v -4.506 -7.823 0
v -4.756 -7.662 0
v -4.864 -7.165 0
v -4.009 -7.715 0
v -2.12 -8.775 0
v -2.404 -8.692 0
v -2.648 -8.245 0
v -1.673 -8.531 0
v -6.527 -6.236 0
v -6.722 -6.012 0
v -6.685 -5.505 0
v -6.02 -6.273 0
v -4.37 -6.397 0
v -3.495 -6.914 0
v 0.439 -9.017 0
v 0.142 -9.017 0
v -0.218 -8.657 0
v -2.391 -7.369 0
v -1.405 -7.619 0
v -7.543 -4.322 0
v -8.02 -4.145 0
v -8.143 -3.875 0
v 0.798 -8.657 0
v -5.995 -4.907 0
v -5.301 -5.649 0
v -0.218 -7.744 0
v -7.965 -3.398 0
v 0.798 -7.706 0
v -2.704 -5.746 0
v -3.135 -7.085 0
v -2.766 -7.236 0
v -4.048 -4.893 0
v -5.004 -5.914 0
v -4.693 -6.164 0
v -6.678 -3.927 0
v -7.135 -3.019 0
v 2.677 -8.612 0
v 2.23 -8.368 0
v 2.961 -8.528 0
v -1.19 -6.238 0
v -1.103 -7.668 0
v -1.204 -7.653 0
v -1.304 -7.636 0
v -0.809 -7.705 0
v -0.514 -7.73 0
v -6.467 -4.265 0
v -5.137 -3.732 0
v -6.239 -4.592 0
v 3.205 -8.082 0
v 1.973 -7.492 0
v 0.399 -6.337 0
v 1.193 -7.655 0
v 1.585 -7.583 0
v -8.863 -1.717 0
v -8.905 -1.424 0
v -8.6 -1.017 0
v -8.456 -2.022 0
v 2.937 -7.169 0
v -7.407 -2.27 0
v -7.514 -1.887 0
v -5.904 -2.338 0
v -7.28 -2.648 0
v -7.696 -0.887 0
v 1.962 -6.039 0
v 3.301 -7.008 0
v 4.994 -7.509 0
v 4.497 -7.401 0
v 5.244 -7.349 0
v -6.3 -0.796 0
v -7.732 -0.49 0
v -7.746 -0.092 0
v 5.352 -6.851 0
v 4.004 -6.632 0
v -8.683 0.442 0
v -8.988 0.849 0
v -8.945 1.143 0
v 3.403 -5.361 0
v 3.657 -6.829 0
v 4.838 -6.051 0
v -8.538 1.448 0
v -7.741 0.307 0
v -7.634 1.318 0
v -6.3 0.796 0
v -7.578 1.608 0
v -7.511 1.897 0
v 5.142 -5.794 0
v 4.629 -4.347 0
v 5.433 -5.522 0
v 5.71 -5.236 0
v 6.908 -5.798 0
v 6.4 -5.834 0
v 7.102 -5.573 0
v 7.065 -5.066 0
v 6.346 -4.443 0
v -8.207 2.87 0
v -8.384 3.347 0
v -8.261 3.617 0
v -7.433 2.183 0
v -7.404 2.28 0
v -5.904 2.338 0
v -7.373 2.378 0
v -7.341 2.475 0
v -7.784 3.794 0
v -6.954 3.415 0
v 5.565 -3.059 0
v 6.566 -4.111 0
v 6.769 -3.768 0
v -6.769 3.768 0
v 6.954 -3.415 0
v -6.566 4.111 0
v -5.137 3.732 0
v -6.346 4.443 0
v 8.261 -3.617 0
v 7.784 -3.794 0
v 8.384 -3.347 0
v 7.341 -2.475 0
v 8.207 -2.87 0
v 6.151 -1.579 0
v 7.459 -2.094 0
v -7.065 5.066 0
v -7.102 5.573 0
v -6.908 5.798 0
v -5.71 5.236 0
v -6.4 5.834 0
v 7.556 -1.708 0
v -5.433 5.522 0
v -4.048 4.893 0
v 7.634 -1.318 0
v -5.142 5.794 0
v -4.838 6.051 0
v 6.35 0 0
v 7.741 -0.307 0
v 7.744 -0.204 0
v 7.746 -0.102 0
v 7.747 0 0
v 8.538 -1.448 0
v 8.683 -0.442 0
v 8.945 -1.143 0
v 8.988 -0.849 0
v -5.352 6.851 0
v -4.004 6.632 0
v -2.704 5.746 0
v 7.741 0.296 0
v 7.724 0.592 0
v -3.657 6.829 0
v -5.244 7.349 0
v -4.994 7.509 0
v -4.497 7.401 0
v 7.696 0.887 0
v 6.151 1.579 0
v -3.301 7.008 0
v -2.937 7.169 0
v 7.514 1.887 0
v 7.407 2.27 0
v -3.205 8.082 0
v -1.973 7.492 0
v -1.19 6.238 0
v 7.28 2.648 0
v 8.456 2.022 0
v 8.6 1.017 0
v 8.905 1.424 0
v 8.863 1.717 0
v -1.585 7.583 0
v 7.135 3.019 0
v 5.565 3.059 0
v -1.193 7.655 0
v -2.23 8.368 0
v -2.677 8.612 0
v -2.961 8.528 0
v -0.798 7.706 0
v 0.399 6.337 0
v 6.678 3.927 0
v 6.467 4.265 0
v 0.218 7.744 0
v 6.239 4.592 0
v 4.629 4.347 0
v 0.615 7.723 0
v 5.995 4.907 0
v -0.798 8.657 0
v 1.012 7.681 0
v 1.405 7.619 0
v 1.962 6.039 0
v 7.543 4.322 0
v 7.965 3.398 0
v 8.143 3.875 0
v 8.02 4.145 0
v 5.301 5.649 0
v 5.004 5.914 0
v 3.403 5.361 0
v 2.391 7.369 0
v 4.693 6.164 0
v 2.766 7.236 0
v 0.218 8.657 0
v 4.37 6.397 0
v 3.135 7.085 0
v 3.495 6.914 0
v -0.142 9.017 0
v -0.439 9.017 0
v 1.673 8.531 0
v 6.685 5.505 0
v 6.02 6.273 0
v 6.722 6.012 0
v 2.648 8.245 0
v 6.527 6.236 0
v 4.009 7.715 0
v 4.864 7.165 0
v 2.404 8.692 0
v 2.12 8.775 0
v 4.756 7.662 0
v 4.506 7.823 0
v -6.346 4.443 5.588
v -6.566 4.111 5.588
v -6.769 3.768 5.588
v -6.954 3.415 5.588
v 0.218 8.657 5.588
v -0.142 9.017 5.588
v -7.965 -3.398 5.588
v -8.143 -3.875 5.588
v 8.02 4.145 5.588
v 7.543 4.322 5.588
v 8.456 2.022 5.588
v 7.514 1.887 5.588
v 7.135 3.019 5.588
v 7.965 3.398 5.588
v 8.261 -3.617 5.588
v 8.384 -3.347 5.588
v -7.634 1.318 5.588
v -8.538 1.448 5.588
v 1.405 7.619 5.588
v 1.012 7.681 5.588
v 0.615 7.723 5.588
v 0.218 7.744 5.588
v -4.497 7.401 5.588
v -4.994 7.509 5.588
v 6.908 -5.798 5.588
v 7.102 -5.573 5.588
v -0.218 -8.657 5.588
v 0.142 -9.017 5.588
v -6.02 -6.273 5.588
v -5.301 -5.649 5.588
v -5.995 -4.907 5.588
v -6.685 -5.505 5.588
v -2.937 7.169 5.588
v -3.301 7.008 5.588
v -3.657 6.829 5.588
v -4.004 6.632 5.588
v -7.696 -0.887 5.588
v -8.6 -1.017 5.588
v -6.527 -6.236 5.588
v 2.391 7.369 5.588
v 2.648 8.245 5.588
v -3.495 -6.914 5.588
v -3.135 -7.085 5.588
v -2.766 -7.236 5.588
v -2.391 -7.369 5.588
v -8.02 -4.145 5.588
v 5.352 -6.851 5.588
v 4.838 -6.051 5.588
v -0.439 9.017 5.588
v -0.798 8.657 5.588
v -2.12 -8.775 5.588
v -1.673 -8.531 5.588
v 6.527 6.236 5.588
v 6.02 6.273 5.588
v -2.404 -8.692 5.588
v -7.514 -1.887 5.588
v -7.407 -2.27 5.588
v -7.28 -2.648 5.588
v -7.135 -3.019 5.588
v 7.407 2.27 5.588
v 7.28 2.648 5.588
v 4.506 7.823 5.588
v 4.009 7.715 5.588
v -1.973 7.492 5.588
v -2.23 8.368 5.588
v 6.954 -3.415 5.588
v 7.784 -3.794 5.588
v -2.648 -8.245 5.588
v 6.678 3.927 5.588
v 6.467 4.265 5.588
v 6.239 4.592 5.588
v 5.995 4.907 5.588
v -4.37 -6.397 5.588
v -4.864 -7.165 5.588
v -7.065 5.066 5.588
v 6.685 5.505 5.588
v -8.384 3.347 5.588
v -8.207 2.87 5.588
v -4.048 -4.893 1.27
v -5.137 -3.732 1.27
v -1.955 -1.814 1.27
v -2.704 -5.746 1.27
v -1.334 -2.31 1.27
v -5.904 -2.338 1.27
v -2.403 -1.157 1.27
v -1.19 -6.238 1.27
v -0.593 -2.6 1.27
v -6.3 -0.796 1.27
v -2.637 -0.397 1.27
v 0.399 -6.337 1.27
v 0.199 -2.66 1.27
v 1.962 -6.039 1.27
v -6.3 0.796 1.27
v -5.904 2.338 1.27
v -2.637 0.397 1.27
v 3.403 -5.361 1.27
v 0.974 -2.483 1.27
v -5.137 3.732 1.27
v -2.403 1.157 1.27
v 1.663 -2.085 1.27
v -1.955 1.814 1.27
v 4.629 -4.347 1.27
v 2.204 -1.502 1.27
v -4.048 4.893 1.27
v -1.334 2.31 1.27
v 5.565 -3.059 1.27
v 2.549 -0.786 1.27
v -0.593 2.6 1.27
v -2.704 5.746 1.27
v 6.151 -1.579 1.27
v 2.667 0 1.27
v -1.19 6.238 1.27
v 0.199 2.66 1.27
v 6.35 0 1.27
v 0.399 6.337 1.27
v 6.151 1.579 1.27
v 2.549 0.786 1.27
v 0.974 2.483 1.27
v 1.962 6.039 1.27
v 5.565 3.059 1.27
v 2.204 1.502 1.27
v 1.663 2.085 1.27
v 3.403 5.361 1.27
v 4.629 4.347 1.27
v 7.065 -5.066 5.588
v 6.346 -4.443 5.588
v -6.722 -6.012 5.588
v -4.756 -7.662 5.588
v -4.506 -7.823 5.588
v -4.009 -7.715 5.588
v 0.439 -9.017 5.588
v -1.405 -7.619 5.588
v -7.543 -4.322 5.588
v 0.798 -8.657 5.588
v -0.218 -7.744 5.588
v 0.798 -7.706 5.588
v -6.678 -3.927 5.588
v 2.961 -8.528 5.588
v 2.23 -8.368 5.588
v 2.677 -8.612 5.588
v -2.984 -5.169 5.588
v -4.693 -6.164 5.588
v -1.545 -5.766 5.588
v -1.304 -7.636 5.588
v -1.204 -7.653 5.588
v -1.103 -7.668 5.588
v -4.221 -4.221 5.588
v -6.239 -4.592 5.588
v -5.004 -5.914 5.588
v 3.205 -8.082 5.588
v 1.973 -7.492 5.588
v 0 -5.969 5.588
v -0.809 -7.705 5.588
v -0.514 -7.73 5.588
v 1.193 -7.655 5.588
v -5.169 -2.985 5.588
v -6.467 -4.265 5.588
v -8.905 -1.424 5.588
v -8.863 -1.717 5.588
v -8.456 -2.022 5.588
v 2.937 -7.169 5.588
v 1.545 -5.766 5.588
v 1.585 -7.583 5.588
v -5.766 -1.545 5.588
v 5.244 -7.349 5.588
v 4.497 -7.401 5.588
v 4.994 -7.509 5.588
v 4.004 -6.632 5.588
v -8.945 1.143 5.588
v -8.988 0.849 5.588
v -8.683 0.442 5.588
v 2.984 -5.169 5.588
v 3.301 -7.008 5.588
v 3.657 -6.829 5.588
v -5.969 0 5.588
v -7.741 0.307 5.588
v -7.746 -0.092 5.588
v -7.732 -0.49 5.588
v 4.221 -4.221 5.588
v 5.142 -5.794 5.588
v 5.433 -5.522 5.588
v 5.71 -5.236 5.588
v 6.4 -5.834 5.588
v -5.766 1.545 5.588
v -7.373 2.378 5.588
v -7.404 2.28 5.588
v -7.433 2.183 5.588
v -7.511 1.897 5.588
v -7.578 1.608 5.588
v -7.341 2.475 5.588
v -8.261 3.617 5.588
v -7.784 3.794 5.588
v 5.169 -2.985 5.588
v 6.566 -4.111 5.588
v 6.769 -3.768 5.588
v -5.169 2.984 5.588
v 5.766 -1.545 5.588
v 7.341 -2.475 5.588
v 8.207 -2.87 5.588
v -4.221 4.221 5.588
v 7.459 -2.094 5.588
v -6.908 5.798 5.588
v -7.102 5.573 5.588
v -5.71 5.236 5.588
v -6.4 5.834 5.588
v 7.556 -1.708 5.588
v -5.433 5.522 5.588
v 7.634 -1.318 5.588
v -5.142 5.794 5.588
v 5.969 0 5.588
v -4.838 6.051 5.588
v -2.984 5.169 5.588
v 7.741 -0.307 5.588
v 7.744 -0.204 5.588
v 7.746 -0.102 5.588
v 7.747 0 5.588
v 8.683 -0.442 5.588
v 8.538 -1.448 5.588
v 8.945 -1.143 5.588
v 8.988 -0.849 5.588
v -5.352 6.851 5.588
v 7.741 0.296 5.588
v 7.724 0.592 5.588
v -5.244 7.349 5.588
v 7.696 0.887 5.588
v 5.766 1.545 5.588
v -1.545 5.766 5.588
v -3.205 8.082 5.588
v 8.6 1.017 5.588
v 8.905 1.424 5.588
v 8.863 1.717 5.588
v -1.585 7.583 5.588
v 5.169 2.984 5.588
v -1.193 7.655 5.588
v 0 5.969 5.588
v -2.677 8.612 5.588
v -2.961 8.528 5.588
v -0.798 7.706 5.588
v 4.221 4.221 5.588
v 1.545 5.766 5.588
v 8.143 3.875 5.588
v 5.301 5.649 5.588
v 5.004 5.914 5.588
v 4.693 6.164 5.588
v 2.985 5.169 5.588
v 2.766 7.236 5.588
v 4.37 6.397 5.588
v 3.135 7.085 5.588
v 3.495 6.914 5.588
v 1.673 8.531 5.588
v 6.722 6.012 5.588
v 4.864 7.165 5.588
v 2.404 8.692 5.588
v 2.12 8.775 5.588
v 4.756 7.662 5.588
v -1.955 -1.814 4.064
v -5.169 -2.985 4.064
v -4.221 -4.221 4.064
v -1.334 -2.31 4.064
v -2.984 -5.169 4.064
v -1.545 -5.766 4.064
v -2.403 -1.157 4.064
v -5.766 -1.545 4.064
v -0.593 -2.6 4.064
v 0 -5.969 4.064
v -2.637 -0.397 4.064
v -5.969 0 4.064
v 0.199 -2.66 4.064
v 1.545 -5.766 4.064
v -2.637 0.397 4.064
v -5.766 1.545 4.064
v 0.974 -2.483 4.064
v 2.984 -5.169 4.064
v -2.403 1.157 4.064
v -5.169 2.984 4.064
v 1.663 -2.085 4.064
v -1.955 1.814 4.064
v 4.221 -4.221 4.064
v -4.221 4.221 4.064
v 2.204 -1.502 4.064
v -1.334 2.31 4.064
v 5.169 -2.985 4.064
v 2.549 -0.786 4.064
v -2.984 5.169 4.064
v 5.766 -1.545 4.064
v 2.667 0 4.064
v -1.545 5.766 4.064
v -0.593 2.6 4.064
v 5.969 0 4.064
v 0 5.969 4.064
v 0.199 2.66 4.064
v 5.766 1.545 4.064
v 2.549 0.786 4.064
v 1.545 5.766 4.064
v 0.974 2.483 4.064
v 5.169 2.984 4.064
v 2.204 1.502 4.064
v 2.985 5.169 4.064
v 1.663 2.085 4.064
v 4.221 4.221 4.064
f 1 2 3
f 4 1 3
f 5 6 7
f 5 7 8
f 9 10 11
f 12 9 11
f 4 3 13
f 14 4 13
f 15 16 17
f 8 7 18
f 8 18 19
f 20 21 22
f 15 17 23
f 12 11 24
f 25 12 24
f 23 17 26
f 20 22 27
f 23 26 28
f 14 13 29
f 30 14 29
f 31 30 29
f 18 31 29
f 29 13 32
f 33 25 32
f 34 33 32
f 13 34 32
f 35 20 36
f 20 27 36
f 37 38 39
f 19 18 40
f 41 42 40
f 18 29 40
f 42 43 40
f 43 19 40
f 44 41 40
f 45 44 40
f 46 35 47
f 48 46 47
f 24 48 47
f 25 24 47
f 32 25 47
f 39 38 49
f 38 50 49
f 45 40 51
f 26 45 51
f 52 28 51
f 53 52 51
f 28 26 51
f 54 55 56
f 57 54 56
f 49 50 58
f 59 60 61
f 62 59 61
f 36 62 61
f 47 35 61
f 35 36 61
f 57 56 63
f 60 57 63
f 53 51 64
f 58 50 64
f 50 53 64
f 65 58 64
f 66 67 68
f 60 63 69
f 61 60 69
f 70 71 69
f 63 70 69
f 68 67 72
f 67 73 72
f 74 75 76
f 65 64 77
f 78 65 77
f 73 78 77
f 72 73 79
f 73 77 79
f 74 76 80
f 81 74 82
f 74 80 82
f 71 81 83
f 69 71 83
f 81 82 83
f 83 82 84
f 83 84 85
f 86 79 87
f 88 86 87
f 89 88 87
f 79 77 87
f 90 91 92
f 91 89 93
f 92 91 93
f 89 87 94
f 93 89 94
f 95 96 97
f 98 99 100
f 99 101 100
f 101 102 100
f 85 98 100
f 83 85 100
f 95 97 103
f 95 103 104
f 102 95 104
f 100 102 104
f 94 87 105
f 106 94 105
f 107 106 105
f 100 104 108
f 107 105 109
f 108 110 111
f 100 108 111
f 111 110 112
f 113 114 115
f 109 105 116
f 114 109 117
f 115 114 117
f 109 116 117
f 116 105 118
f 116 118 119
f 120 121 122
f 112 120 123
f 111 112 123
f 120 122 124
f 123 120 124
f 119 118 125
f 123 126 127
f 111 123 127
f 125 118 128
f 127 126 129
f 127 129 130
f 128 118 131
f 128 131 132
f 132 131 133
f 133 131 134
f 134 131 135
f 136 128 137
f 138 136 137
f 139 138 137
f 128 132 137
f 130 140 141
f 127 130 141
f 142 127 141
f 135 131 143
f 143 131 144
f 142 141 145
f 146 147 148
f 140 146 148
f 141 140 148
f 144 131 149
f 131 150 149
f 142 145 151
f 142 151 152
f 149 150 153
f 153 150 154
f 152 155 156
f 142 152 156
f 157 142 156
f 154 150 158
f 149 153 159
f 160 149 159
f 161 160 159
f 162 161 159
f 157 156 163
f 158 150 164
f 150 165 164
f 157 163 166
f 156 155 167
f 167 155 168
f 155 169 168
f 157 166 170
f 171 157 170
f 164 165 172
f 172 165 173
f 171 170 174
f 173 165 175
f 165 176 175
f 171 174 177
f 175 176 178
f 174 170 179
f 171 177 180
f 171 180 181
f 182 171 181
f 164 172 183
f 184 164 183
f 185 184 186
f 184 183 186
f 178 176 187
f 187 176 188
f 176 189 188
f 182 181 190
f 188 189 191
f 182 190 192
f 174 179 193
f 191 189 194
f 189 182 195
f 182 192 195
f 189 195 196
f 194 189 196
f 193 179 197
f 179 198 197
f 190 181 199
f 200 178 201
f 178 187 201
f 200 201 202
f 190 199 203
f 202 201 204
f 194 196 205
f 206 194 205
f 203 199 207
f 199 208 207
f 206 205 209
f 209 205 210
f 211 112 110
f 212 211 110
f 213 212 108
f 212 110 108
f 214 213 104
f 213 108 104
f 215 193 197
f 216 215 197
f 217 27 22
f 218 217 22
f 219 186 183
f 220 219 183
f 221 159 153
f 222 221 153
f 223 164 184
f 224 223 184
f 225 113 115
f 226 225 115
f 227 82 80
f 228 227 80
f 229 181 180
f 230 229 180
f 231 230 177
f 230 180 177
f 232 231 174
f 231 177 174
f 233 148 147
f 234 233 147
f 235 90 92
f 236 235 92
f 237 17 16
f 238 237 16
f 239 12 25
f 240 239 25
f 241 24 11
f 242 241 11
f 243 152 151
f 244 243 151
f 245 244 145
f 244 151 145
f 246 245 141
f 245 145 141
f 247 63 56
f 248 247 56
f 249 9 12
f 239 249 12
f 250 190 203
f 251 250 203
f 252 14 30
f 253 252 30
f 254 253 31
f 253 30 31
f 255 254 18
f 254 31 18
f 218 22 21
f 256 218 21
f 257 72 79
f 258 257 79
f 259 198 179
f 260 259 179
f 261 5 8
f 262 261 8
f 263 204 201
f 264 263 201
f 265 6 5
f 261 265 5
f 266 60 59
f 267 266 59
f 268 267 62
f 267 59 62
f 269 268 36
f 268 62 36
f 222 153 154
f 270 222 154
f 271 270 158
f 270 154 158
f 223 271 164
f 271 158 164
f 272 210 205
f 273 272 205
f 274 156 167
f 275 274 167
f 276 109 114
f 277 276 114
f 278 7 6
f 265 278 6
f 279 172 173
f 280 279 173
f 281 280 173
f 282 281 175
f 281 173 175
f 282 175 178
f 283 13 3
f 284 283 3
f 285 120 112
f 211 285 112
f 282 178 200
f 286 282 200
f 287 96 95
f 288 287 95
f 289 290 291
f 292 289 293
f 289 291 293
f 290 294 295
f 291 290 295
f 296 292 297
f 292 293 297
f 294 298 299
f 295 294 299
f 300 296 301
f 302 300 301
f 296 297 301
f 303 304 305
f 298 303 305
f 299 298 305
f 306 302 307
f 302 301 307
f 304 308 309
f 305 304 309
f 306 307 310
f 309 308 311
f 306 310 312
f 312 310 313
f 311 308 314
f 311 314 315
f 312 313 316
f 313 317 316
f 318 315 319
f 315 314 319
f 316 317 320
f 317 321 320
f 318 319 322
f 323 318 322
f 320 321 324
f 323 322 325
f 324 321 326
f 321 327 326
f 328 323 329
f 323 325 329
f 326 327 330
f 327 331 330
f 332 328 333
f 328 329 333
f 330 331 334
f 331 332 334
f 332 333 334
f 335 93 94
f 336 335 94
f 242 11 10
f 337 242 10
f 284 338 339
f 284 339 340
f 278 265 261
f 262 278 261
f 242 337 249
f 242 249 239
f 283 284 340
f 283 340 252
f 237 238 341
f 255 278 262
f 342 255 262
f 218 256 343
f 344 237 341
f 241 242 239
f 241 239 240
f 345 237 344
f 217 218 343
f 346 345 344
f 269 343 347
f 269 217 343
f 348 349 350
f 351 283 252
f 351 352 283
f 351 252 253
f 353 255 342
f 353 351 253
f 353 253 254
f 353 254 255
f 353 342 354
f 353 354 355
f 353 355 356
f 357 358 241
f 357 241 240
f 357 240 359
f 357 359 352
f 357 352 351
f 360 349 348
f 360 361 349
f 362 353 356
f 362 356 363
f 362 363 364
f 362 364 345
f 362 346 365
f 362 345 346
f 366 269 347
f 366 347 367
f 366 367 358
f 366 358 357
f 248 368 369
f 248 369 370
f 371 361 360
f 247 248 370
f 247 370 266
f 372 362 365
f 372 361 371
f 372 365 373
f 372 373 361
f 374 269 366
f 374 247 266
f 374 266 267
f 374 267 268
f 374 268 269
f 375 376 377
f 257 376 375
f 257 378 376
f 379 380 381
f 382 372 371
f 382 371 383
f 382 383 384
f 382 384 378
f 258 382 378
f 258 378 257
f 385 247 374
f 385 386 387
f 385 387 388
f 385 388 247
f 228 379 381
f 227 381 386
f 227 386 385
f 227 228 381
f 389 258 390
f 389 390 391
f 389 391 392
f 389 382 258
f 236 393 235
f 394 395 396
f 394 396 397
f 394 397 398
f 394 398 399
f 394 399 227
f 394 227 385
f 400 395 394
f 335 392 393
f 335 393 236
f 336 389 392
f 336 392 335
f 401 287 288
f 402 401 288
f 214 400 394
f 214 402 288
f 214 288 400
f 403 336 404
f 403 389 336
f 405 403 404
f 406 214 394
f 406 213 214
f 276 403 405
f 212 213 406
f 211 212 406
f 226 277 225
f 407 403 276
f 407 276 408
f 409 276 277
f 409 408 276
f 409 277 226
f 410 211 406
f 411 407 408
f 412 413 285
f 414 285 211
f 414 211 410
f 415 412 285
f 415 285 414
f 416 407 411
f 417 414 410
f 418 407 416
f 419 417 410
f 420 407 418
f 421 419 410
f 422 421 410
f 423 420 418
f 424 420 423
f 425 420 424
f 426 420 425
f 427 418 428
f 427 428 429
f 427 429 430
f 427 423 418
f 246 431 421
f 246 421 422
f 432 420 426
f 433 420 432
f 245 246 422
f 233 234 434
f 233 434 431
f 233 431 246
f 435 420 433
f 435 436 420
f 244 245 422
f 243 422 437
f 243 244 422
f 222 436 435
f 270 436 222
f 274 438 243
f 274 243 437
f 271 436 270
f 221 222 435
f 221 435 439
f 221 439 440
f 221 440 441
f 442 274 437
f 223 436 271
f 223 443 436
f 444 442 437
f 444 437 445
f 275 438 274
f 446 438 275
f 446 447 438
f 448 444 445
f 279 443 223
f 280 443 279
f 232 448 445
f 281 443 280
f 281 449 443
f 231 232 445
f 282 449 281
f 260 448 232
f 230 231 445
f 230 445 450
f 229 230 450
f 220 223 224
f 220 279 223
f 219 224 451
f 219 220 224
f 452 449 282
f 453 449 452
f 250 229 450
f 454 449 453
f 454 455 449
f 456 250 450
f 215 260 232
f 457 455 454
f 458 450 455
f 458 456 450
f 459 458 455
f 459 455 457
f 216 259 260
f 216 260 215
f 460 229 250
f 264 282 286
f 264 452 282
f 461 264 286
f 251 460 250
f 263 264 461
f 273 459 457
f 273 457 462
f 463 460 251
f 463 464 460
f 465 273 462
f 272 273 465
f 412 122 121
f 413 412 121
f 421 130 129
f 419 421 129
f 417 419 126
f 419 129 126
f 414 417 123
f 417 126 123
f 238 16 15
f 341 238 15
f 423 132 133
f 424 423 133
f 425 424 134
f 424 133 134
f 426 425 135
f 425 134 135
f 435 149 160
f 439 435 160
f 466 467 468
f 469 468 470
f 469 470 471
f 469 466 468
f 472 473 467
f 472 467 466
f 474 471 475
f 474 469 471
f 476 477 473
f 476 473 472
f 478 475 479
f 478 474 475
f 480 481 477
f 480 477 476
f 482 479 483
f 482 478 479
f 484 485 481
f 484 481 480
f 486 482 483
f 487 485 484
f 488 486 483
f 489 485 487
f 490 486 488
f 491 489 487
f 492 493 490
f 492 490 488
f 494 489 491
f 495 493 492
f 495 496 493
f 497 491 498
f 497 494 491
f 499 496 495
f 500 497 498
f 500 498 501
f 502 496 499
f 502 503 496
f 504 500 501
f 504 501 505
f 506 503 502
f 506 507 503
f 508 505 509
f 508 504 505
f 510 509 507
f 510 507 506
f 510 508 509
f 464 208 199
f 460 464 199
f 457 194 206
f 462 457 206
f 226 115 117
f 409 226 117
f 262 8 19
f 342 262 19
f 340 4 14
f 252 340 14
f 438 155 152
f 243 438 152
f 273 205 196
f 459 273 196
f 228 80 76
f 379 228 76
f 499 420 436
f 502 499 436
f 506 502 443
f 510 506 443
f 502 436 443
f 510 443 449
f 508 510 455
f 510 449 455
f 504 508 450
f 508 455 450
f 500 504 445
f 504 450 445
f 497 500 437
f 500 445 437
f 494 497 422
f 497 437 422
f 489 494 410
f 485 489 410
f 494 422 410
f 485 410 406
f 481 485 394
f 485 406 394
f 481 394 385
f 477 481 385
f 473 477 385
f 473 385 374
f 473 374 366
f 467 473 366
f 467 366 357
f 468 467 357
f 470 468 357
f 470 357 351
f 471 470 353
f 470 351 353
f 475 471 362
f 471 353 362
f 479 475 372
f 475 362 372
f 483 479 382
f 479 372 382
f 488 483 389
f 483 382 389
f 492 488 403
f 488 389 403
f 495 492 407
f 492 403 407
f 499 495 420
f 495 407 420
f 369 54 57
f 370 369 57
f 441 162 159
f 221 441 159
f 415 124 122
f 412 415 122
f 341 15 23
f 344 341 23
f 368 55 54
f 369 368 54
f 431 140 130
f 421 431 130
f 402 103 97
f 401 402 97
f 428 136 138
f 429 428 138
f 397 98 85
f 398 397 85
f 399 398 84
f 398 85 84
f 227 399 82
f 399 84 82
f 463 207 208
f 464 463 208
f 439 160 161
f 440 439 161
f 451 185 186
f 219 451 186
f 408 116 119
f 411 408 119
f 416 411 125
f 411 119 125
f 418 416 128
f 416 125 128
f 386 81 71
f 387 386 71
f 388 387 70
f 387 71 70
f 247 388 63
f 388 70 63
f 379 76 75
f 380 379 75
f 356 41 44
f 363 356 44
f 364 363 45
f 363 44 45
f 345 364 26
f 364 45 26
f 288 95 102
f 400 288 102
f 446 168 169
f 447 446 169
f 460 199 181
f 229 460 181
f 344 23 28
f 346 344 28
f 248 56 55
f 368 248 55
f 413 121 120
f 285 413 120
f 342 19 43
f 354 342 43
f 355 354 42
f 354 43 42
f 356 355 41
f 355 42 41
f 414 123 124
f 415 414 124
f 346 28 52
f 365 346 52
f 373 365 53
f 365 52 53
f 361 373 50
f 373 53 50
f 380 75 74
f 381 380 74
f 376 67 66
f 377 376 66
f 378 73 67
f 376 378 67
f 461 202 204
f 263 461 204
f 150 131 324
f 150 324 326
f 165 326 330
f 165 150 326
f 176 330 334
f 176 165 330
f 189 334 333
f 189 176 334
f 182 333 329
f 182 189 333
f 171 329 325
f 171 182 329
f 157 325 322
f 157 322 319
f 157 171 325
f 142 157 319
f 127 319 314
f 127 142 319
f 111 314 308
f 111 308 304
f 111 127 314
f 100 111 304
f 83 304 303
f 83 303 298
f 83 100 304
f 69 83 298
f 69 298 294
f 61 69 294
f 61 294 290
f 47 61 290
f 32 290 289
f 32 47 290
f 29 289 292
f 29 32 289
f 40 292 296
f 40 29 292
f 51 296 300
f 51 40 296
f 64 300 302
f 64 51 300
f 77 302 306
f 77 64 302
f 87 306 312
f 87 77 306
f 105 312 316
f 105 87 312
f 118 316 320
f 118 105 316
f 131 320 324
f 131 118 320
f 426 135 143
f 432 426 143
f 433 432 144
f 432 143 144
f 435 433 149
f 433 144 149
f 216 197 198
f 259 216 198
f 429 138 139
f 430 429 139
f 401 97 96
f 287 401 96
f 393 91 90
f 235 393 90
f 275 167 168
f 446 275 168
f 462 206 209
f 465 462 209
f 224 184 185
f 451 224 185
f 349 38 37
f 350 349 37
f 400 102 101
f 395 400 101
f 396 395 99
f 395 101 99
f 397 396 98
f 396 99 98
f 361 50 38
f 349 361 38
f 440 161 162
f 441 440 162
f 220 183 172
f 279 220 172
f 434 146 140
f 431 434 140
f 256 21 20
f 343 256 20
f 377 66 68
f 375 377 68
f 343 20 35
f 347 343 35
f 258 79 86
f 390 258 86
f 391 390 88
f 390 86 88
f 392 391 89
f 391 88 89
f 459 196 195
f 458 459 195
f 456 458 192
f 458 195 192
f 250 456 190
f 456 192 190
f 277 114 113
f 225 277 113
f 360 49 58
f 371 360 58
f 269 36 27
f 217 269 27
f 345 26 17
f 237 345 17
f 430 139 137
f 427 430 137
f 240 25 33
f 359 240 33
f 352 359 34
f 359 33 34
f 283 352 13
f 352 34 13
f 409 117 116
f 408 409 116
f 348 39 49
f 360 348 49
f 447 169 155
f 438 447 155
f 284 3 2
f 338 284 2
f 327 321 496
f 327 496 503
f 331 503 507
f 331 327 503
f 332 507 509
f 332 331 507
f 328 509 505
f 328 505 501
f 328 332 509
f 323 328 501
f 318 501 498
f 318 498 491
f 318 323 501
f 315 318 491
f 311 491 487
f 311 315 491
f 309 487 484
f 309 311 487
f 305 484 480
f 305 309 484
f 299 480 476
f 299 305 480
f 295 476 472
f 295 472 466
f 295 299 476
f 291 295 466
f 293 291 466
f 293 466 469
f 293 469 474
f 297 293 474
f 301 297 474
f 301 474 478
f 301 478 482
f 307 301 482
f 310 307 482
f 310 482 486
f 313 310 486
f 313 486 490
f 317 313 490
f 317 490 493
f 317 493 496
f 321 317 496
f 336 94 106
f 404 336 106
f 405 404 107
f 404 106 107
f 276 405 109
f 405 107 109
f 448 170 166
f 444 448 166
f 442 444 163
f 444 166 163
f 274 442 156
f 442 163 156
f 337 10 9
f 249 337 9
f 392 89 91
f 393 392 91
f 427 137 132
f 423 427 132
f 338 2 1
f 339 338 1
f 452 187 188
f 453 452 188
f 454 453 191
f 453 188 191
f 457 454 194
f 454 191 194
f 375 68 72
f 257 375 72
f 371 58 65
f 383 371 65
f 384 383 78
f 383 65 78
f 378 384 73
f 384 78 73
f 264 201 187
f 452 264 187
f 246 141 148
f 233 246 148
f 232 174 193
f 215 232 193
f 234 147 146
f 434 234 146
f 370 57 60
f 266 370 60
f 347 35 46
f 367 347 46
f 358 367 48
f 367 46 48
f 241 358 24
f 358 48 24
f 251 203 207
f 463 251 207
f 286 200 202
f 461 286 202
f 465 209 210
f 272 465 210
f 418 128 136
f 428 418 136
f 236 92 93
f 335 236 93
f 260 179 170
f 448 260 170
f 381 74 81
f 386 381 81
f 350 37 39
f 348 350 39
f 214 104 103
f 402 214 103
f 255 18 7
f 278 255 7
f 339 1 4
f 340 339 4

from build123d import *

# Parameters (mm, degrees)
F0_R     = 2.667
F1_DEPTH = 5.588
F2_DEPTH = 5.588
F3_COUNT = 22
F5_R     = 6.35
F5_R_2   = 2.667
F6_DEPTH = 1.27
F4_R     = 5.969
F4_R_2   = 2.667
F7_DEPTH = 1.524


with BuildPart() as f1:
    # F0 (on Top) → F1 (new body)
    with BuildSketch(Plane.XY):
        with BuildLine():
            ThreePointArc((-0.7982498419, 7.705764478), (-5.1880616551, -5.753262141), (7.747, 0))
            ThreePointArc((7.747, 0), (5.5544090358, 5.4004212116), (0.2177501581, 7.74393917))
            ThreePointArc((0.2177501581, 7.74393917), (-0.2908767737, 7.7415372958), (-0.7982498419, 7.705764478))
        make_face()
        Circle(F0_R, mode=Mode.SUBTRACT)
    extrude(amount=F1_DEPTH)

    # F0 (on Top) → F2 (join)
    with BuildSketch(Plane.XY):
        with BuildLine():
            ThreePointArc((-0.7982498419, 7.705764478), (-0.2908767737, 7.7415372958), (0.2177501581, 7.74393917))
            Line((0.2177501581, 7.74393917), (0.2177501581, 8.6572673449))
            Line((0.2177501581, 8.6572673449), (0, 8.875017503))
            Line((0, 8.875017503), (-0.141982497, 9.017))
            Line((-0.141982497, 9.017), (-0.4385171868, 9.017))
            Line((-0.4385171868, 9.017), (-0.7194063476, 8.7361108392))
            Line((-0.7194063476, 8.7361108392), (-0.7982498419, 8.6572673449))
            Line((-0.7982498419, 8.6572673449), (-0.7982498419, 7.705764478))
        make_face()
    extrude(amount=F2_DEPTH)

    # F3: F1 ×22 about axis
    f3_axis = Axis((0, 0, 0), (0, 0, -1))


with BuildPart() as f1_1:
    add(f1.part)
    for i in range(1, F3_COUNT):
        add(f1.part.rotate(f3_axis, i * 360 / F3_COUNT))

    # F5 (on face) → F6 (cut)
    with BuildSketch(Plane.XY):
        Circle(F5_R)
        Circle(F5_R_2, mode=Mode.SUBTRACT)
    extrude(amount=F6_DEPTH, mode=Mode.SUBTRACT)

    # F4 (on face) → F7 (cut)
    with BuildSketch(Plane.XY.offset(5.588)):
        Circle(F4_R)
        Circle(F4_R_2, mode=Mode.SUBTRACT)
    extrude(amount=-F7_DEPTH, mode=Mode.SUBTRACT)


solid = f1_1.part
